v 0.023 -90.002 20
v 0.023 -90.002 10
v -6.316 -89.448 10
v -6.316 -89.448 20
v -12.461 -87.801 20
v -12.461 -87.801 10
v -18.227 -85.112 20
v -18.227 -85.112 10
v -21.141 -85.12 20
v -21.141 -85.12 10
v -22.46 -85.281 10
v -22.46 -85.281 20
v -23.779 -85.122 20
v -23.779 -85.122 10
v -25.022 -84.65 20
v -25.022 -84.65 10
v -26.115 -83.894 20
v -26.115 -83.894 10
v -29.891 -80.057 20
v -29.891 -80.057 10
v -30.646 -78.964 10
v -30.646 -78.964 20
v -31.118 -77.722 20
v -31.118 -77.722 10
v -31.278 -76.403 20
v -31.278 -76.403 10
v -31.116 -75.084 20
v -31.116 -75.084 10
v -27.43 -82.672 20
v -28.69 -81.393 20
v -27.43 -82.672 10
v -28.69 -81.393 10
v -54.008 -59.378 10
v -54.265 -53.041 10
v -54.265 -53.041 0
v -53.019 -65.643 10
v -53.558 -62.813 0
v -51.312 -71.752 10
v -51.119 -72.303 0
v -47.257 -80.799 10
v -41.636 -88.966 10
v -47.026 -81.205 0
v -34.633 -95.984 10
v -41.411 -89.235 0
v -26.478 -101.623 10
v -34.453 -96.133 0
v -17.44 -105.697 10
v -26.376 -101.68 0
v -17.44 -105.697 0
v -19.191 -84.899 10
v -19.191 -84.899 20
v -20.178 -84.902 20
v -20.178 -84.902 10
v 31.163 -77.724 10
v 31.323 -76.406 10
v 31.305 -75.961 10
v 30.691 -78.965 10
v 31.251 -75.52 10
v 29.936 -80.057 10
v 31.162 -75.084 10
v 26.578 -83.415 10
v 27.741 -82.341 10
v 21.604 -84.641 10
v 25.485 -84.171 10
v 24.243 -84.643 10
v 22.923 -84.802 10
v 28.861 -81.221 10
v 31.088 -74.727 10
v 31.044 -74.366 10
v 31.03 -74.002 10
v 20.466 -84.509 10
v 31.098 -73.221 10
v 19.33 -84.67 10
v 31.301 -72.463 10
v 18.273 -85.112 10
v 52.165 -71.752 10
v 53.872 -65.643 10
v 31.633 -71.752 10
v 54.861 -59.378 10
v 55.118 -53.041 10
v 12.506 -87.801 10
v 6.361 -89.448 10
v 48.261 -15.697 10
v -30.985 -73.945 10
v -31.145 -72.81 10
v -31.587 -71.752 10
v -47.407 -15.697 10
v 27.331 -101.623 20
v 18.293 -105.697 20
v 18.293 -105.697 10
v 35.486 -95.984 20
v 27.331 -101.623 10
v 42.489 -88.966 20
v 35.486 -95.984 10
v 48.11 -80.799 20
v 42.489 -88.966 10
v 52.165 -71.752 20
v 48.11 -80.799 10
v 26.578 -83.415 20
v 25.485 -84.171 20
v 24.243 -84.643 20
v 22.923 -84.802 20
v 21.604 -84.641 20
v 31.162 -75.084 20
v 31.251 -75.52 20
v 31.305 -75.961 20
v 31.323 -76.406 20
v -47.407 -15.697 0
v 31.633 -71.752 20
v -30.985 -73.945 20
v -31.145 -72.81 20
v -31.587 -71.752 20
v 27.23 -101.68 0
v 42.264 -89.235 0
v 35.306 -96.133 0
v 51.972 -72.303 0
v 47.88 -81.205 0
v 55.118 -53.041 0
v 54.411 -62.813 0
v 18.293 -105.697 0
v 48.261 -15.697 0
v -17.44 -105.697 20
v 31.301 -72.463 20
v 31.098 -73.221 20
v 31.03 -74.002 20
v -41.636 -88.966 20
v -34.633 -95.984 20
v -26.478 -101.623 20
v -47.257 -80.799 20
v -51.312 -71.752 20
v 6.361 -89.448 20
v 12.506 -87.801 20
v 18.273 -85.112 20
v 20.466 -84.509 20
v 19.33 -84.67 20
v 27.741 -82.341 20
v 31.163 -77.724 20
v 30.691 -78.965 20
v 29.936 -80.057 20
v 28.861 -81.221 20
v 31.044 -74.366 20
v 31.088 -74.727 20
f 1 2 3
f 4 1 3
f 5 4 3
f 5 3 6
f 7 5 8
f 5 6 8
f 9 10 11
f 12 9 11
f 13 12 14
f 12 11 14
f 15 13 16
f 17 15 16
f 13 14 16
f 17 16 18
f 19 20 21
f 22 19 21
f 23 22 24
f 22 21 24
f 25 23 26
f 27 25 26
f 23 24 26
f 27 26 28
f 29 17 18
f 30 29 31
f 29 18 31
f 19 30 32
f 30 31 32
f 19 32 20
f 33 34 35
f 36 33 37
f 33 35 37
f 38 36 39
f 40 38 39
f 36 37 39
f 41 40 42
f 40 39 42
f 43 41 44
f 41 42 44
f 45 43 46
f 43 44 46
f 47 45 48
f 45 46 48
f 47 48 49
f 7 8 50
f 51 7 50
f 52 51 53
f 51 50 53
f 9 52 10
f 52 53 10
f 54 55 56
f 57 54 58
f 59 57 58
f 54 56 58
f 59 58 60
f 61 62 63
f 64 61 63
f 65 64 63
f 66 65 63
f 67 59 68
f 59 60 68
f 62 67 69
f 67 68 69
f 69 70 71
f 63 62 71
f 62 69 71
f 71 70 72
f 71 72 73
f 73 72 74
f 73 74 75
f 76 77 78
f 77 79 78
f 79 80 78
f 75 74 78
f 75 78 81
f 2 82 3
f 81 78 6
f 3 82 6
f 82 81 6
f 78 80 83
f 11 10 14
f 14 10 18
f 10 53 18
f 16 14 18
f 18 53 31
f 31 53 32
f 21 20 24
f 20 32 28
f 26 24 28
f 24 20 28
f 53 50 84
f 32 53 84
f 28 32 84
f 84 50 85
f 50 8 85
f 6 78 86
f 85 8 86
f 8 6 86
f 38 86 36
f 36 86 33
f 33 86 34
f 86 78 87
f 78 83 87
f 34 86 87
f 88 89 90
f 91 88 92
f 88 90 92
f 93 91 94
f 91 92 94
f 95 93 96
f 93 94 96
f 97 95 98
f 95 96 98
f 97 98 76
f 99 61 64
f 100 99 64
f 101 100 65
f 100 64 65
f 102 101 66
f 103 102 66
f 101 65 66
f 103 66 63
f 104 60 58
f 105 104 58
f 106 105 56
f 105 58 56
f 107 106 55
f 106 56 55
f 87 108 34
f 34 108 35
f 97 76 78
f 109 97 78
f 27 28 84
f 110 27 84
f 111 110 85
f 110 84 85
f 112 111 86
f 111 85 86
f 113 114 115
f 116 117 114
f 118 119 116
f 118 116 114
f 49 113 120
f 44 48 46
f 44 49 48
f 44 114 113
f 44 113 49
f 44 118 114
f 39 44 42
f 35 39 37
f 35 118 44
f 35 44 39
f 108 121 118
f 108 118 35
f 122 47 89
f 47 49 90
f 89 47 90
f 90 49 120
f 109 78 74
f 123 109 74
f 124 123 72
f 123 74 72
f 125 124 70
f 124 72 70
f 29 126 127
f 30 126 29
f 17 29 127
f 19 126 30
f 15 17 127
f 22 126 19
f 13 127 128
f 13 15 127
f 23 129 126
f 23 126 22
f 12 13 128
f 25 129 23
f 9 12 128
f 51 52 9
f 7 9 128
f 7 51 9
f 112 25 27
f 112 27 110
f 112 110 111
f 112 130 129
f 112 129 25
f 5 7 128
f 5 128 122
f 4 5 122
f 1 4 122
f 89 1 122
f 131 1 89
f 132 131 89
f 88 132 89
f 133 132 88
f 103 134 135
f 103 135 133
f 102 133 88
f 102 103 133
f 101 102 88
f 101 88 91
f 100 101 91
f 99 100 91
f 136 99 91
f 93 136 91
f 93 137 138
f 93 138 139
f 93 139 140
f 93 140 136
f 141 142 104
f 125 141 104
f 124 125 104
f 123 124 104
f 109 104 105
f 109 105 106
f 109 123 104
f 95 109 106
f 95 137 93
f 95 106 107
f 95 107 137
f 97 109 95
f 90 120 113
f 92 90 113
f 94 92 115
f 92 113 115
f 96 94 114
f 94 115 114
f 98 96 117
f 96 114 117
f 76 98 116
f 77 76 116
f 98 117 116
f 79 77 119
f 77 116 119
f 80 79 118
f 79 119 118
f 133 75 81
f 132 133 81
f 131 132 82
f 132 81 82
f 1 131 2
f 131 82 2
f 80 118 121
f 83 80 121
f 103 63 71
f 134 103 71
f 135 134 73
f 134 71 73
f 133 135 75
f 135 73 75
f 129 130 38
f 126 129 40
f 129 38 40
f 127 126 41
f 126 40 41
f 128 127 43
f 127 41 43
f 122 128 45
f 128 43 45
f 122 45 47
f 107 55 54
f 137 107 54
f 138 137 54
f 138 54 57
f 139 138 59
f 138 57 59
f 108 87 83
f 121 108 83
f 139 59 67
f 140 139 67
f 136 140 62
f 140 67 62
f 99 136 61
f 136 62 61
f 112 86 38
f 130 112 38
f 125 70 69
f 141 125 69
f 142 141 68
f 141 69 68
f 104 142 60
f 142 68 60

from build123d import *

# Parameters (mm, degrees)
BOSS_EXTRUDE1_DEPTH = 10
SKETCH4_W           = 147.370034426
SKETCH4_H           = 21.427690466
CUT_EXTRUDE1_DEPTH  = 10
SKETCH5_W           = 178.746295464
SKETCH5_H           = 112.332779524
CUT_EXTRUDE2_DEPTH  = 10
BOSS_EXTRUDE2_DEPTH = 10


with BuildPart() as part:
    # Sketch2 → Boss-Extrude1 (new body)
    with BuildSketch(Plane.XY):
        with BuildLine():
            Line((24.926564885, 56.003129771), (45.126564885, -53.996870229))
            ThreePointArc((45.126564885, -53.996870229), (0.426564885, -98.696870229), (-44.273435115, -53.996870229))
            Line((-44.273435115, -53.996870229), (-24.073435115, 56.003129771))
            ThreePointArc((-24.073435115, 56.003129771), (0.426564885, 80.503129771), (24.926564885, 56.003129771))
        make_face()
        with BuildLine():
            ThreePointArc((34.912427768, 56.990682917), (0.426564885, 90.503129771), (-34.059297997, 56.990682917))
            Line((-34.059297997, 56.990682917), (-54.265079147, -53.040798592))
            Line((-54.265079147, -53.040798592), (-44.097865596, -53.040798592))
            Line((-44.097865596, -53.040798592), (-24.073435115, 56.003129771))
            ThreePointArc((-24.073435115, 56.003129771), (0.426564885, 80.503129771), (24.926564885, 56.003129771))
            Line((24.926564885, 56.003129771), (44.950995367, -53.040798592))
            Line((44.950995367, -53.040798592), (55.118208918, -53.040798592))
            Line((55.118208918, -53.040798592), (34.912427768, 56.990682917))
        make_face()
        with BuildLine():
            Line((-44.097865596, -53.040798592), (-54.265079147, -53.040798592))
            ThreePointArc((-54.265079147, -53.040798592), (0.426564885, -108.696870229), (55.118208918, -53.040798592))
            Line((55.118208918, -53.040798592), (44.950995367, -53.040798592))
            Line((44.950995367, -53.040798592), (45.126564885, -53.996870229))
            ThreePointArc((45.126564885, -53.996870229), (0.426564885, -98.696870229), (-44.273435115, -53.996870229))
            Line((-44.273435115, -53.996870229), (-44.097865596, -53.040798592))
        make_face()
    extrude(amount=BOSS_EXTRUDE1_DEPTH)

    # Sketch4 → Cut-Extrude1 (cut)
    with BuildSketch(Plane.XY.offset(10)):
        with Locations((2.831713815, -116.410715462)):
            Rectangle(SKETCH4_W, SKETCH4_H)
    extrude(amount=-CUT_EXTRUDE1_DEPTH, mode=Mode.SUBTRACT)

    # Sketch5 → Cut-Extrude2 (cut)
    with BuildSketch(Plane.XY.offset(10)):
        with Locations((1.072635833, 40.469519533)):
            Rectangle(SKETCH5_W, SKETCH5_H)
    extrude(amount=-CUT_EXTRUDE2_DEPTH, mode=Mode.SUBTRACT)

    # Sketch7 → Boss-Extrude2 (add)
    with BuildSketch(Plane.XY.offset(10)):
        with BuildLine():
            ThreePointArc((18.272585974, -85.111995747), (9.46948112, -88.758361168), (0.022585974, -90.002068509))
            Line((0.022585974, -90.002068509), (0.426564885, -105.696870229))
            Line((0.426564885, -105.696870229), (18.292734033, -105.696870229))
            ThreePointArc((18.292734033, -105.696870229), (39.146778966, -92.634093493), (52.164780298, -71.752068509))
            Line((52.164780298, -71.752068509), (31.632513212, -71.752068509))
            ThreePointArc((31.632513212, -71.752068509), (31.182961311, -72.837382806), (31.029627529, -74.002068509))
            ThreePointArc((31.029627529, -74.002068509), (31.062741779, -74.546982904), (31.161597173, -75.083877552))
            ThreePointArc((31.161597173, -75.083877552), (31.282420431, -75.740082121), (31.322893404, -76.406088604))
            ThreePointArc((31.322893404, -76.406088604), (30.964488909, -78.359033984), (29.935985893, -80.057454127))
            ThreePointArc((29.935985893, -80.057454127), (28.306857221, -81.786339756), (26.577971592, -83.415468427))
            ThreePointArc((26.577971592, -83.415468427), (24.242573732, -84.642622104), (21.604395017, -84.641079707))
            ThreePointArc((21.604395017, -84.641079707), (19.892817757, -84.553395532), (18.272585974, -85.111995747))
        make_face()
        with BuildLine():
            Line((0.426564885, -105.696870229), (0.022585974, -90.002068509))
            ThreePointArc((0.022585974, -90.002068509), (-9.424309172, -88.758361168), (-18.227414026, -85.111995747))
            ThreePointArc((-18.227414026, -85.111995747), (-19.684925655, -84.873628919), (-21.141112037, -85.119962255))
            ThreePointArc((-21.141112037, -85.119962255), (-23.779290752, -85.121504652), (-26.114688612, -83.894350975))
            ThreePointArc((-26.114688612, -83.894350975), (-28.067407493, -82.039534694), (-29.890813945, -80.057454127))
            ThreePointArc((-29.890813945, -80.057454127), (-31.117967622, -77.722056267), (-31.116425225, -75.083877552))
            ThreePointArc((-31.116425225, -75.083877552), (-31.028741049, -73.372300292), (-31.587341264, -71.752068509))
            Line((-31.587341264, -71.752068509), (-51.311650527, -71.752068509))
            ThreePointArc((-51.311650527, -71.752068509), (-38.293649195, -92.634093493), (-17.439604262, -105.696870229))
            Line((-17.439604262, -105.696870229), (0.426564885, -105.696870229))
        make_face()
    extrude(amount=BOSS_EXTRUDE2_DEPTH)


solid = part.part
